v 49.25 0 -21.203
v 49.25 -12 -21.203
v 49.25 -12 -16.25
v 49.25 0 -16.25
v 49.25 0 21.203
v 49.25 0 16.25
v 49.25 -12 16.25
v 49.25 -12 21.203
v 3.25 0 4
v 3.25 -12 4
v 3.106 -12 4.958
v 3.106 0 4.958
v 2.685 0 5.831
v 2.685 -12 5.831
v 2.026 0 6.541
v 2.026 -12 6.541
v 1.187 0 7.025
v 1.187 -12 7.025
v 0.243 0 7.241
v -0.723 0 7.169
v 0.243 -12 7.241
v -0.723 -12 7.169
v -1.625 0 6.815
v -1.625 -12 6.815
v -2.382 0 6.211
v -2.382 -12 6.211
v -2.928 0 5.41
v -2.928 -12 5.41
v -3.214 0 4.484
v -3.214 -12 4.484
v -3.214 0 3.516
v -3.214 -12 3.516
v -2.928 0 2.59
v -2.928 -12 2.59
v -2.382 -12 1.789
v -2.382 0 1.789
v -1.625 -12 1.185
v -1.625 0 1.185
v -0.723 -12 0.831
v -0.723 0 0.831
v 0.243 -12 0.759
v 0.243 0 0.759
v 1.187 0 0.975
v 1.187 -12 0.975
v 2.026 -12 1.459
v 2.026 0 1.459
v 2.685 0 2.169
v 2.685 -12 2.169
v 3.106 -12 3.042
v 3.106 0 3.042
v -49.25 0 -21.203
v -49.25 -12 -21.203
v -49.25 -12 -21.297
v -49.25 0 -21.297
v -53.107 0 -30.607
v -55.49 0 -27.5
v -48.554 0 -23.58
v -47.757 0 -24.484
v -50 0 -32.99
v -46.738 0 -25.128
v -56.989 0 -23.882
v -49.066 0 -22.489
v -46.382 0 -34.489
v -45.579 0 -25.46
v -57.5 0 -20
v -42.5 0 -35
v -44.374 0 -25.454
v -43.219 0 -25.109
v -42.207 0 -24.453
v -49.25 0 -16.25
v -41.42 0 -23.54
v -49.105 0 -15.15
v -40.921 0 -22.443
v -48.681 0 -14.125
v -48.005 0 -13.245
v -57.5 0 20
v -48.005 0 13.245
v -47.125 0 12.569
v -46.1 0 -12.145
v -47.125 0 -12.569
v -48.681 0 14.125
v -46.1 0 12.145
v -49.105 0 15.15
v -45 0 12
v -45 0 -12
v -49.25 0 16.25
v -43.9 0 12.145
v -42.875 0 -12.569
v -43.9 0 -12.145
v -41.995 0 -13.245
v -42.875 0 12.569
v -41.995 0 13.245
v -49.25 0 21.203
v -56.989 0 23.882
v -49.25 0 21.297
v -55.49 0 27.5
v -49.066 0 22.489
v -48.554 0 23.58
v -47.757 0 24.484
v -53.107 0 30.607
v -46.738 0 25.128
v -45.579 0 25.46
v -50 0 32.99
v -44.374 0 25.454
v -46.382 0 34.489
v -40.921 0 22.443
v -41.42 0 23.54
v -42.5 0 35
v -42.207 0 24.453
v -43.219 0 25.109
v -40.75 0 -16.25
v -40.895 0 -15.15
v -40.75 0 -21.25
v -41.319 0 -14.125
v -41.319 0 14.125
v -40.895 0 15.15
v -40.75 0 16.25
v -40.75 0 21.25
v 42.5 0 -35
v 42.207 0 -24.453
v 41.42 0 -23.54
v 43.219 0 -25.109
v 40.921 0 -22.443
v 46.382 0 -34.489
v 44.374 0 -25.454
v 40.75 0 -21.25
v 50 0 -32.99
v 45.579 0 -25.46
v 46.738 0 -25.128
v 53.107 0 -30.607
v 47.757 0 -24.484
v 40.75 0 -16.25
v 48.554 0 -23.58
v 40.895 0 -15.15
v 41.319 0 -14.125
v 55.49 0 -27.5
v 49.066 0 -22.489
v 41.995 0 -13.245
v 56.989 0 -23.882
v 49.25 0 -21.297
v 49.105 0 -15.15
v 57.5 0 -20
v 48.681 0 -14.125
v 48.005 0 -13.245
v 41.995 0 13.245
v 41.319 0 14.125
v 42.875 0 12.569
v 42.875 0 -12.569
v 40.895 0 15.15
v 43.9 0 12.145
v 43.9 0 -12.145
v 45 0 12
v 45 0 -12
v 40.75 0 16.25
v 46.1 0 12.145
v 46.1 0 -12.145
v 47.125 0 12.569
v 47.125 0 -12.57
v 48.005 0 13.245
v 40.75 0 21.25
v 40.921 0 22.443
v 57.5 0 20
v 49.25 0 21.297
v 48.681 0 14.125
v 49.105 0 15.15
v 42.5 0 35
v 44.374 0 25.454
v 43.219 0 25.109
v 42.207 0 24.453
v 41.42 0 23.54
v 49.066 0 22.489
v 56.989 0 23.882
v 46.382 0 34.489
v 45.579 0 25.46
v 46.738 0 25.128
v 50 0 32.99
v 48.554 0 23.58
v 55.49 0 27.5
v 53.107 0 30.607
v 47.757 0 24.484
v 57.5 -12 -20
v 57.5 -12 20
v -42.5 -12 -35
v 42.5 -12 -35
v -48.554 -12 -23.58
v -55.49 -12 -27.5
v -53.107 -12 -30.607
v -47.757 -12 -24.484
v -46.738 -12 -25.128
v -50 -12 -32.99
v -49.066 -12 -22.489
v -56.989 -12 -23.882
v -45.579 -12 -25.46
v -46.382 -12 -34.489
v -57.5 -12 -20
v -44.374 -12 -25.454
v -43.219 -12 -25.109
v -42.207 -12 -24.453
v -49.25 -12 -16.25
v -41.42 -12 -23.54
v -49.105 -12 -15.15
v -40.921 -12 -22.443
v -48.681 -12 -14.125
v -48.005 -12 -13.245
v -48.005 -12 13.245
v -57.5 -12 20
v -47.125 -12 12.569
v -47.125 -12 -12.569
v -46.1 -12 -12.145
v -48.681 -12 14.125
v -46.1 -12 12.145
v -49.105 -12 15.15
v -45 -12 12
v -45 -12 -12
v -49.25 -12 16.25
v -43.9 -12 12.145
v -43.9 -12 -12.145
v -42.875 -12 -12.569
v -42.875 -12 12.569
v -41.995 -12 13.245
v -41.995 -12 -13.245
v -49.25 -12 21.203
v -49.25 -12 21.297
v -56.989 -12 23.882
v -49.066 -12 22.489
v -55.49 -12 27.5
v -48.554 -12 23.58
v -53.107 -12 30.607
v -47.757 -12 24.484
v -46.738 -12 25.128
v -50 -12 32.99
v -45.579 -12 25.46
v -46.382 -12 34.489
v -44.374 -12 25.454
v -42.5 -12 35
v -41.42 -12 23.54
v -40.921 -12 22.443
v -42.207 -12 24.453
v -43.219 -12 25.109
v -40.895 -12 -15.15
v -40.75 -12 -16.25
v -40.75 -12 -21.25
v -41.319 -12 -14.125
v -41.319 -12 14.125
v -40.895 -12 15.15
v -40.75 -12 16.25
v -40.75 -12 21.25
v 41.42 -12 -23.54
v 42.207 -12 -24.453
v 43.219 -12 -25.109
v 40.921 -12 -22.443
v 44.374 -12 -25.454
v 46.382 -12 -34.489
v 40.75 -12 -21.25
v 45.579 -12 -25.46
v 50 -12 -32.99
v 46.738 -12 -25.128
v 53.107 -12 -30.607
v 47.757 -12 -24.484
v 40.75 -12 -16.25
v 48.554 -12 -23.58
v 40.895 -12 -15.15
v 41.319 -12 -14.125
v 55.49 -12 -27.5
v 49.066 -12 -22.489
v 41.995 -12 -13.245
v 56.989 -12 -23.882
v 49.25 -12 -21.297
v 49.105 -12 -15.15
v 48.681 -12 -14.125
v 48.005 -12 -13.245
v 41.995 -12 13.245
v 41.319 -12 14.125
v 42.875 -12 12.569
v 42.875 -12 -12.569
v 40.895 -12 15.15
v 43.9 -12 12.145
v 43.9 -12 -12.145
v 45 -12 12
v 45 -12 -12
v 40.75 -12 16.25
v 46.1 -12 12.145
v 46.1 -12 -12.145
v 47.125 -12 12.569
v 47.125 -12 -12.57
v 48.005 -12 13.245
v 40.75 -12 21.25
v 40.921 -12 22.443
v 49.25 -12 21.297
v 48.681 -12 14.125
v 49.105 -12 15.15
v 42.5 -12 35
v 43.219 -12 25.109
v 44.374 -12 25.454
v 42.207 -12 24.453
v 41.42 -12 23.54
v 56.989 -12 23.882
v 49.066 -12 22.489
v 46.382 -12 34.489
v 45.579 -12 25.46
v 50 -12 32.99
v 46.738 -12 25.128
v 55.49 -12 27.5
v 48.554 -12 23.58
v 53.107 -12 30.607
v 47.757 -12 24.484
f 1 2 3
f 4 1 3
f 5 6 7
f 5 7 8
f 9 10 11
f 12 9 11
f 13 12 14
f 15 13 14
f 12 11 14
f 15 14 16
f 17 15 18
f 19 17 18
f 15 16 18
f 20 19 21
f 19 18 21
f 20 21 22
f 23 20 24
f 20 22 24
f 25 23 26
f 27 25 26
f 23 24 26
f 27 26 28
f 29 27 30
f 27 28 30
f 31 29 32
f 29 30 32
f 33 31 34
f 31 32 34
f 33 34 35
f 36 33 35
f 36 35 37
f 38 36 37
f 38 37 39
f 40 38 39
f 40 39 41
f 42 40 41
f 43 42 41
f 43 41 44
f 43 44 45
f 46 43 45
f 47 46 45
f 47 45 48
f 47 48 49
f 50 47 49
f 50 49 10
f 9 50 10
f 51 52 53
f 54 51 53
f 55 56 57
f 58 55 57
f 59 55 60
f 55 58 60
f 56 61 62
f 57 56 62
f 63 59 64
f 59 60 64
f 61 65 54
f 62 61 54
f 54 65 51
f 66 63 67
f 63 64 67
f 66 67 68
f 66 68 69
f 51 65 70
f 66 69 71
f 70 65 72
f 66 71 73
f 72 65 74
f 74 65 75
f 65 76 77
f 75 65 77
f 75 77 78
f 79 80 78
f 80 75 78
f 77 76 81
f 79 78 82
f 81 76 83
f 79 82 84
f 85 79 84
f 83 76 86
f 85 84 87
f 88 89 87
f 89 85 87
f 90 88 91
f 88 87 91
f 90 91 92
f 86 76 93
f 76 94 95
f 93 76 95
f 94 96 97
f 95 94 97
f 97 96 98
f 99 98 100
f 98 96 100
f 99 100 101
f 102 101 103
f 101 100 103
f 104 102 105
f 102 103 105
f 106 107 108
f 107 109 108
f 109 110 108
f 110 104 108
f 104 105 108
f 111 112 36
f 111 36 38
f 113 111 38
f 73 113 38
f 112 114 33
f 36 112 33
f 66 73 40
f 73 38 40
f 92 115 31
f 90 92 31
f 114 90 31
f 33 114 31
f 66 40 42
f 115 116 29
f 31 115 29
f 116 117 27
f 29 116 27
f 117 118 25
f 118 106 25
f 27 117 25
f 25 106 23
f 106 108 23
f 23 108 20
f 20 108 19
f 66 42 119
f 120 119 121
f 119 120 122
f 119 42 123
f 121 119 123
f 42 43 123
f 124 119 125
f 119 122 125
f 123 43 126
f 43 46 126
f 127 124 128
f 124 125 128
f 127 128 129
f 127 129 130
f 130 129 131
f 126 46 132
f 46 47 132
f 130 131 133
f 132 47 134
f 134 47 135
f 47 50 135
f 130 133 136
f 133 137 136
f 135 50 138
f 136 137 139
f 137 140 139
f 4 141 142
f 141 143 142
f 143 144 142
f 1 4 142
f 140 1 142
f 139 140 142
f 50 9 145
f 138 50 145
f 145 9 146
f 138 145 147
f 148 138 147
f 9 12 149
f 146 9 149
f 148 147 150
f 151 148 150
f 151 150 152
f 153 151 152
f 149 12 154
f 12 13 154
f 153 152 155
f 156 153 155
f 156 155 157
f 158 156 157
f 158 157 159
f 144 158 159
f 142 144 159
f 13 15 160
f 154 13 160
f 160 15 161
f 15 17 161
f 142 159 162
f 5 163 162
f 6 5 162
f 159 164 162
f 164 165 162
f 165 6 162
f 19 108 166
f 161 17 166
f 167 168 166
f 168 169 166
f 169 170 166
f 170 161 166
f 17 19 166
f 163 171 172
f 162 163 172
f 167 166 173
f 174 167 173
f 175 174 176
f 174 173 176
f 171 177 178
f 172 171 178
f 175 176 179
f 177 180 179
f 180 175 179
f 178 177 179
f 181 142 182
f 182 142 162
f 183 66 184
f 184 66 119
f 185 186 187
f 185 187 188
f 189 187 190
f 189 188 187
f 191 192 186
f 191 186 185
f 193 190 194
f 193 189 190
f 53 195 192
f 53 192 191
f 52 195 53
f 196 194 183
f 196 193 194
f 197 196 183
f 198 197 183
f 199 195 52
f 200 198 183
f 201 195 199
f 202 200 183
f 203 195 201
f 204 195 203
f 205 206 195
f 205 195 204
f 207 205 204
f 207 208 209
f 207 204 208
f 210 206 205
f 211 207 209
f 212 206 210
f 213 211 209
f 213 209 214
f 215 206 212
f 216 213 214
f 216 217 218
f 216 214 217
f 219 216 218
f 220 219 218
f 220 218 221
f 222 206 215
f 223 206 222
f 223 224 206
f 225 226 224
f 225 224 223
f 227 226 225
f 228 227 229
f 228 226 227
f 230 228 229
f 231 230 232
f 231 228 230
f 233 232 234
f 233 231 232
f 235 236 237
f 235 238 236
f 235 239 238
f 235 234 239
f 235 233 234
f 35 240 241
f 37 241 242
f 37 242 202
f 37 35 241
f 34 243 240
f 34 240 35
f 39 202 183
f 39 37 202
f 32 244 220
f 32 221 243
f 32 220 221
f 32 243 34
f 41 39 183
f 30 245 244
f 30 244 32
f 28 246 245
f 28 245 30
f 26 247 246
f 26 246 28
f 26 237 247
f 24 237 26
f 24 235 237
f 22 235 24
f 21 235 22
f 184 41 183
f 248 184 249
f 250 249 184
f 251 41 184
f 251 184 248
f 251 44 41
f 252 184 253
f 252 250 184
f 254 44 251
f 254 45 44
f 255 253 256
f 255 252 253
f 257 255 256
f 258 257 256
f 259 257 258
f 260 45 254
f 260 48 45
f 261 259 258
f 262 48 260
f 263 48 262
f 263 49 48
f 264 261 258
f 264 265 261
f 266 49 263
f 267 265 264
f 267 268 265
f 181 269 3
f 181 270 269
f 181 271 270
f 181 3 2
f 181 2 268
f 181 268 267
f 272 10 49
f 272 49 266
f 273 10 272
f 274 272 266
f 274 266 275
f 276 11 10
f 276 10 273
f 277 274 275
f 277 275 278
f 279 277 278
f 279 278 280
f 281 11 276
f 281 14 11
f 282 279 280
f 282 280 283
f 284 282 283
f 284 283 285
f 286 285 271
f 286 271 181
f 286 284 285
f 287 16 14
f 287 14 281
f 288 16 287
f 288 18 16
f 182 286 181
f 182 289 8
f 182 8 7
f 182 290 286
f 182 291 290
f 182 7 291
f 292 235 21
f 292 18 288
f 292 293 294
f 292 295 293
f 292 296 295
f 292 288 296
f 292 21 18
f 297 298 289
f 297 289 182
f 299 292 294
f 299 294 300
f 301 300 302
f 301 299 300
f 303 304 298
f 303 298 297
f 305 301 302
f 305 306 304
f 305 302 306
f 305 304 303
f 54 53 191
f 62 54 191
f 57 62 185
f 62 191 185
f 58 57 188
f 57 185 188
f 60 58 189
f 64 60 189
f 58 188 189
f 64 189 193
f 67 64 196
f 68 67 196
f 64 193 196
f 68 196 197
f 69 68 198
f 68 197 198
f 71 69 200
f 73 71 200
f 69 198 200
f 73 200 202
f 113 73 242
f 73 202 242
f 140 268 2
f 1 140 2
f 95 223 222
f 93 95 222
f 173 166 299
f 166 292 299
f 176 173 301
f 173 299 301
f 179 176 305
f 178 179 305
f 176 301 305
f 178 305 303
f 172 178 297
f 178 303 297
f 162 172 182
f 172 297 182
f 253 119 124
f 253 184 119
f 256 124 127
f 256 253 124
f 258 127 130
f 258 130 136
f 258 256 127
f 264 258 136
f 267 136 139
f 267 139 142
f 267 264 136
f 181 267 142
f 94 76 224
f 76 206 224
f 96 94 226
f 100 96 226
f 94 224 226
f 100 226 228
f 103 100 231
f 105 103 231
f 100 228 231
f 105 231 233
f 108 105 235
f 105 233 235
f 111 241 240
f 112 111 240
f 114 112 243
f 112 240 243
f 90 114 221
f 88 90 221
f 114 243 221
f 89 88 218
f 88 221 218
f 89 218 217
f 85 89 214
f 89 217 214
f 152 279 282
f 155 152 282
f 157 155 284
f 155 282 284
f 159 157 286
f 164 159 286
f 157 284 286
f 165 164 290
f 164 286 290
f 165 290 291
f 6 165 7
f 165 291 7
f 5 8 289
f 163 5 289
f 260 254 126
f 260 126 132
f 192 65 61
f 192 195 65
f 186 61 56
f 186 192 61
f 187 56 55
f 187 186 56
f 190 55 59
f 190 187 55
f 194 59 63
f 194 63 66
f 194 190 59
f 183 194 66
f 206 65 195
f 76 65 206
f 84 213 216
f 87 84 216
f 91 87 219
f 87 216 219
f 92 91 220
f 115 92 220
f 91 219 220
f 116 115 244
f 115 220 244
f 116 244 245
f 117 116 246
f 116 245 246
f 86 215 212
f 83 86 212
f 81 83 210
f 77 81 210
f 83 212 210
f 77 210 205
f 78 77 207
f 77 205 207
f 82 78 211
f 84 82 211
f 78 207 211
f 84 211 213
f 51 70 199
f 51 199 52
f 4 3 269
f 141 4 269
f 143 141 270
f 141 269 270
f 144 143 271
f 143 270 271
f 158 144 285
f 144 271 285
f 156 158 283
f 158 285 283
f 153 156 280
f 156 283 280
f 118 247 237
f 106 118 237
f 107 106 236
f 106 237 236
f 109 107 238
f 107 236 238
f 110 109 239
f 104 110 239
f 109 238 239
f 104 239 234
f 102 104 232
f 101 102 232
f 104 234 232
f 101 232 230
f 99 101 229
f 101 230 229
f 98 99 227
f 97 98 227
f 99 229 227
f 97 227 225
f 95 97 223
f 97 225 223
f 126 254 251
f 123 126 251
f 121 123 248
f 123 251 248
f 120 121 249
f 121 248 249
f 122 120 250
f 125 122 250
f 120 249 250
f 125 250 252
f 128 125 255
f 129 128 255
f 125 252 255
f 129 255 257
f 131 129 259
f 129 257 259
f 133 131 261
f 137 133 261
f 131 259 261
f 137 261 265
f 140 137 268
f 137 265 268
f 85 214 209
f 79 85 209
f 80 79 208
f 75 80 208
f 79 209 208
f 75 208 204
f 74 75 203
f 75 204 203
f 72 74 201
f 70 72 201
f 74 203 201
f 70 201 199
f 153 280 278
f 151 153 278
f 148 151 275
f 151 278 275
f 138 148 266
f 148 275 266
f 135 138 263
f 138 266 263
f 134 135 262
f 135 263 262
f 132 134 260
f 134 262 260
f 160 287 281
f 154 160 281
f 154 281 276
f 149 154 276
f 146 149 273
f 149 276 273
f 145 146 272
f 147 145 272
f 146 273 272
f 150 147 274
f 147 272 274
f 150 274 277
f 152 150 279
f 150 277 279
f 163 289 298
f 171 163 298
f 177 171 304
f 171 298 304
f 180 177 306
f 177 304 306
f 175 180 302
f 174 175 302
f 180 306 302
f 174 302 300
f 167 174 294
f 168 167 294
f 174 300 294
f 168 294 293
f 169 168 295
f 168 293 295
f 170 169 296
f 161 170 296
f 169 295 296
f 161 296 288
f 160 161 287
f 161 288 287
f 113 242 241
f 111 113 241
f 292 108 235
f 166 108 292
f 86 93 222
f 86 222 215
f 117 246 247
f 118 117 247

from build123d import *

# Parameters (mm, degrees)
F0_W     = 115
F0_H     = 70
F1_DEPTH = 12
F2_W     = 4.25
F2_H     = 5
F2_W_2   = 4.2500000007
F3_DEPTH = 25
F4_R     = 3.25
F5_DEPTH = 25
F6_R     = 15


with BuildPart() as f1:
    # F0 (on Front) → F1 (new body)
    with BuildSketch(Plane.XZ):
        Rectangle(F0_W, F0_H)
    extrude(amount=F1_DEPTH)

    # F2 (on face) → F3 (cut)
    with BuildSketch(Plane.XZ.offset(12)):
        with BuildLine():
            Line((-40.75, 16.25), (-40.75, 21.25))
            ThreePointArc((-40.75, 21.25), (-44.9763637107, 25.4999342731), (-49.2497370945, 21.2972718474))
            Line((-49.2497370945, 21.2972718474), (-49.2497419962, 21.2031708885))
            Line((-49.2497419962, 21.2031708885), (-49.2499999942, 16.2502213815))
            ThreePointArc((-49.2499999942, 16.2502213815), (-48.0052820892, 13.2448744512), (-45, 12))
            Line((-45, 12), (-45, 16.25))
            Line((-45, 16.25), (-40.75, 16.25))
        make_face()
        with BuildLine():
            ThreePointArc((49.2497370945, 21.2972718474), (44.9763637107, 25.4999342731), (40.75, 21.25))
            Line((40.75, 21.25), (40.75, 16.25))
            ThreePointArc((40.75, 16.25), (41.99479618, 19.25520382), (45, 20.5))
            ThreePointArc((45, 20.5), (46.9284060776, 20.0373143519), (48.4369317712, 18.75))
            ThreePointArc((48.4369317712, 18.75), (49.041590439, 17.5645519096), (49.2499999942, 16.2502213815))
            Line((49.2499999942, 16.2502213815), (49.2497419962, 21.2031708885))
            Line((49.2497419962, 21.2031708885), (49.2497370945, 21.2972718474))
        make_face()
        with BuildLine():
            ThreePointArc((-45, 12), (-41.99479618, 13.24479618), (-40.75, 16.25))
            Line((-40.75, 16.25), (-45, 16.25))
            Line((-45, 16.25), (-45, 12))
        make_face()
        with BuildLine():
            ThreePointArc((45, 20.5), (41.99479618, 19.25520382), (40.75, 16.25))
            Line((40.75, 16.25), (45, 16.25))
            Line((45, 16.25), (45, 20.5))
        make_face()
        with BuildLine():
            Line((45, 16.25), (40.75, 16.25))
            ThreePointArc((40.75, 16.25), (41.99479618, 13.24479618), (45, 12))
            Line((45, 12), (45, 16.25))
        make_face()
        with BuildLine():
            Line((45, 20.5), (45, 16.25))
            Line((45, 16.25), (45, 12))
            ThreePointArc((45, 12), (48.00520382, 13.24479618), (49.25, 16.25))
            ThreePointArc((49.25, 16.25), (49.2499999986, 16.2501106908), (49.2499999942, 16.2502213815))
            ThreePointArc((49.2499999942, 16.2502213815), (49.041590439, 17.5645519096), (48.4369317712, 18.75))
            ThreePointArc((48.4369317712, 18.75), (46.9284060776, 20.0373143519), (45, 20.5))
        make_face()
        with BuildLine():
            ThreePointArc((-40.75, -16.25), (-41.99479618, -13.24479618), (-45, -12))
            Line((-45, -12), (-45, -16.25))
            Line((-45, -16.25), (-40.75, -16.25))
        make_face()
        with BuildLine():
            Line((-45, -16.25), (-45, -12))
            ThreePointArc((-45, -12), (-48.0052820892, -13.2448744512), (-49.2499999942, -16.2502213815))
            Line((-49.2499999942, -16.2502213815), (-49.2497419962, -21.2031708885))
            Line((-49.2497419962, -21.2031708885), (-49.2497370945, -21.2972718474))
            ThreePointArc((-49.2497370945, -21.2972718474), (-44.9763637107, -25.4999342731), (-40.75, -21.25))
            Line((-40.75, -21.25), (-45, -21.25))
            Line((-45, -21.25), (-45, -16.25))
        make_face()
        with BuildLine():
            ThreePointArc((49.2499999957, -16.2502213815), (48.005242953, -13.2449460071), (45, -12.0001106908))
            Line((45, -12.0001106908), (45, -16.25))
            Line((45, -16.25), (45, -21.25))
            Line((45, -21.25), (40.75, -21.25))
            ThreePointArc((40.75, -21.25), (44.9763637107, -25.4999342731), (49.2497370945, -21.2972718474))
            Line((49.2497370945, -21.2972718474), (49.2497419962, -21.2031708885))
            Line((49.2497419962, -21.2031708885), (49.2499999942, -16.2502213815))
        make_face()
        with BuildLine():
            Line((45, -16.25), (45, -12.0001106908))
            ThreePointArc((45, -12.0001106908), (41.9948353134, -13.2448677349), (40.7499999986, -16.25))
            Line((40.7499999993, -16.25), (45, -16.25))
        make_face()
        with Locations((-42.875, -18.75)):
            Rectangle(F2_W, F2_H)
        with Locations((42.8749999996, -18.75)):
            Rectangle(F2_W_2, F2_H)
    extrude(amount=-F3_DEPTH, mode=Mode.SUBTRACT)

    # F4 (on face) → F5 (cut)
    with BuildSketch(Plane.XZ.offset(12)):
        with Locations((0, 4)):
            Circle(F4_R)
    extrude(amount=-F5_DEPTH, mode=Mode.SUBTRACT)

    # F6
    f6_edges = [f1.edges().sort_by_distance(p)[0] for p in [
        (-57.5, -6, 35),
        (57.5, -6, 35),
        (57.5, -6, -35),
        (-57.5, -6, -35),
    ]]
    fillet(f6_edges, radius=F6_R)


solid = f1.part
